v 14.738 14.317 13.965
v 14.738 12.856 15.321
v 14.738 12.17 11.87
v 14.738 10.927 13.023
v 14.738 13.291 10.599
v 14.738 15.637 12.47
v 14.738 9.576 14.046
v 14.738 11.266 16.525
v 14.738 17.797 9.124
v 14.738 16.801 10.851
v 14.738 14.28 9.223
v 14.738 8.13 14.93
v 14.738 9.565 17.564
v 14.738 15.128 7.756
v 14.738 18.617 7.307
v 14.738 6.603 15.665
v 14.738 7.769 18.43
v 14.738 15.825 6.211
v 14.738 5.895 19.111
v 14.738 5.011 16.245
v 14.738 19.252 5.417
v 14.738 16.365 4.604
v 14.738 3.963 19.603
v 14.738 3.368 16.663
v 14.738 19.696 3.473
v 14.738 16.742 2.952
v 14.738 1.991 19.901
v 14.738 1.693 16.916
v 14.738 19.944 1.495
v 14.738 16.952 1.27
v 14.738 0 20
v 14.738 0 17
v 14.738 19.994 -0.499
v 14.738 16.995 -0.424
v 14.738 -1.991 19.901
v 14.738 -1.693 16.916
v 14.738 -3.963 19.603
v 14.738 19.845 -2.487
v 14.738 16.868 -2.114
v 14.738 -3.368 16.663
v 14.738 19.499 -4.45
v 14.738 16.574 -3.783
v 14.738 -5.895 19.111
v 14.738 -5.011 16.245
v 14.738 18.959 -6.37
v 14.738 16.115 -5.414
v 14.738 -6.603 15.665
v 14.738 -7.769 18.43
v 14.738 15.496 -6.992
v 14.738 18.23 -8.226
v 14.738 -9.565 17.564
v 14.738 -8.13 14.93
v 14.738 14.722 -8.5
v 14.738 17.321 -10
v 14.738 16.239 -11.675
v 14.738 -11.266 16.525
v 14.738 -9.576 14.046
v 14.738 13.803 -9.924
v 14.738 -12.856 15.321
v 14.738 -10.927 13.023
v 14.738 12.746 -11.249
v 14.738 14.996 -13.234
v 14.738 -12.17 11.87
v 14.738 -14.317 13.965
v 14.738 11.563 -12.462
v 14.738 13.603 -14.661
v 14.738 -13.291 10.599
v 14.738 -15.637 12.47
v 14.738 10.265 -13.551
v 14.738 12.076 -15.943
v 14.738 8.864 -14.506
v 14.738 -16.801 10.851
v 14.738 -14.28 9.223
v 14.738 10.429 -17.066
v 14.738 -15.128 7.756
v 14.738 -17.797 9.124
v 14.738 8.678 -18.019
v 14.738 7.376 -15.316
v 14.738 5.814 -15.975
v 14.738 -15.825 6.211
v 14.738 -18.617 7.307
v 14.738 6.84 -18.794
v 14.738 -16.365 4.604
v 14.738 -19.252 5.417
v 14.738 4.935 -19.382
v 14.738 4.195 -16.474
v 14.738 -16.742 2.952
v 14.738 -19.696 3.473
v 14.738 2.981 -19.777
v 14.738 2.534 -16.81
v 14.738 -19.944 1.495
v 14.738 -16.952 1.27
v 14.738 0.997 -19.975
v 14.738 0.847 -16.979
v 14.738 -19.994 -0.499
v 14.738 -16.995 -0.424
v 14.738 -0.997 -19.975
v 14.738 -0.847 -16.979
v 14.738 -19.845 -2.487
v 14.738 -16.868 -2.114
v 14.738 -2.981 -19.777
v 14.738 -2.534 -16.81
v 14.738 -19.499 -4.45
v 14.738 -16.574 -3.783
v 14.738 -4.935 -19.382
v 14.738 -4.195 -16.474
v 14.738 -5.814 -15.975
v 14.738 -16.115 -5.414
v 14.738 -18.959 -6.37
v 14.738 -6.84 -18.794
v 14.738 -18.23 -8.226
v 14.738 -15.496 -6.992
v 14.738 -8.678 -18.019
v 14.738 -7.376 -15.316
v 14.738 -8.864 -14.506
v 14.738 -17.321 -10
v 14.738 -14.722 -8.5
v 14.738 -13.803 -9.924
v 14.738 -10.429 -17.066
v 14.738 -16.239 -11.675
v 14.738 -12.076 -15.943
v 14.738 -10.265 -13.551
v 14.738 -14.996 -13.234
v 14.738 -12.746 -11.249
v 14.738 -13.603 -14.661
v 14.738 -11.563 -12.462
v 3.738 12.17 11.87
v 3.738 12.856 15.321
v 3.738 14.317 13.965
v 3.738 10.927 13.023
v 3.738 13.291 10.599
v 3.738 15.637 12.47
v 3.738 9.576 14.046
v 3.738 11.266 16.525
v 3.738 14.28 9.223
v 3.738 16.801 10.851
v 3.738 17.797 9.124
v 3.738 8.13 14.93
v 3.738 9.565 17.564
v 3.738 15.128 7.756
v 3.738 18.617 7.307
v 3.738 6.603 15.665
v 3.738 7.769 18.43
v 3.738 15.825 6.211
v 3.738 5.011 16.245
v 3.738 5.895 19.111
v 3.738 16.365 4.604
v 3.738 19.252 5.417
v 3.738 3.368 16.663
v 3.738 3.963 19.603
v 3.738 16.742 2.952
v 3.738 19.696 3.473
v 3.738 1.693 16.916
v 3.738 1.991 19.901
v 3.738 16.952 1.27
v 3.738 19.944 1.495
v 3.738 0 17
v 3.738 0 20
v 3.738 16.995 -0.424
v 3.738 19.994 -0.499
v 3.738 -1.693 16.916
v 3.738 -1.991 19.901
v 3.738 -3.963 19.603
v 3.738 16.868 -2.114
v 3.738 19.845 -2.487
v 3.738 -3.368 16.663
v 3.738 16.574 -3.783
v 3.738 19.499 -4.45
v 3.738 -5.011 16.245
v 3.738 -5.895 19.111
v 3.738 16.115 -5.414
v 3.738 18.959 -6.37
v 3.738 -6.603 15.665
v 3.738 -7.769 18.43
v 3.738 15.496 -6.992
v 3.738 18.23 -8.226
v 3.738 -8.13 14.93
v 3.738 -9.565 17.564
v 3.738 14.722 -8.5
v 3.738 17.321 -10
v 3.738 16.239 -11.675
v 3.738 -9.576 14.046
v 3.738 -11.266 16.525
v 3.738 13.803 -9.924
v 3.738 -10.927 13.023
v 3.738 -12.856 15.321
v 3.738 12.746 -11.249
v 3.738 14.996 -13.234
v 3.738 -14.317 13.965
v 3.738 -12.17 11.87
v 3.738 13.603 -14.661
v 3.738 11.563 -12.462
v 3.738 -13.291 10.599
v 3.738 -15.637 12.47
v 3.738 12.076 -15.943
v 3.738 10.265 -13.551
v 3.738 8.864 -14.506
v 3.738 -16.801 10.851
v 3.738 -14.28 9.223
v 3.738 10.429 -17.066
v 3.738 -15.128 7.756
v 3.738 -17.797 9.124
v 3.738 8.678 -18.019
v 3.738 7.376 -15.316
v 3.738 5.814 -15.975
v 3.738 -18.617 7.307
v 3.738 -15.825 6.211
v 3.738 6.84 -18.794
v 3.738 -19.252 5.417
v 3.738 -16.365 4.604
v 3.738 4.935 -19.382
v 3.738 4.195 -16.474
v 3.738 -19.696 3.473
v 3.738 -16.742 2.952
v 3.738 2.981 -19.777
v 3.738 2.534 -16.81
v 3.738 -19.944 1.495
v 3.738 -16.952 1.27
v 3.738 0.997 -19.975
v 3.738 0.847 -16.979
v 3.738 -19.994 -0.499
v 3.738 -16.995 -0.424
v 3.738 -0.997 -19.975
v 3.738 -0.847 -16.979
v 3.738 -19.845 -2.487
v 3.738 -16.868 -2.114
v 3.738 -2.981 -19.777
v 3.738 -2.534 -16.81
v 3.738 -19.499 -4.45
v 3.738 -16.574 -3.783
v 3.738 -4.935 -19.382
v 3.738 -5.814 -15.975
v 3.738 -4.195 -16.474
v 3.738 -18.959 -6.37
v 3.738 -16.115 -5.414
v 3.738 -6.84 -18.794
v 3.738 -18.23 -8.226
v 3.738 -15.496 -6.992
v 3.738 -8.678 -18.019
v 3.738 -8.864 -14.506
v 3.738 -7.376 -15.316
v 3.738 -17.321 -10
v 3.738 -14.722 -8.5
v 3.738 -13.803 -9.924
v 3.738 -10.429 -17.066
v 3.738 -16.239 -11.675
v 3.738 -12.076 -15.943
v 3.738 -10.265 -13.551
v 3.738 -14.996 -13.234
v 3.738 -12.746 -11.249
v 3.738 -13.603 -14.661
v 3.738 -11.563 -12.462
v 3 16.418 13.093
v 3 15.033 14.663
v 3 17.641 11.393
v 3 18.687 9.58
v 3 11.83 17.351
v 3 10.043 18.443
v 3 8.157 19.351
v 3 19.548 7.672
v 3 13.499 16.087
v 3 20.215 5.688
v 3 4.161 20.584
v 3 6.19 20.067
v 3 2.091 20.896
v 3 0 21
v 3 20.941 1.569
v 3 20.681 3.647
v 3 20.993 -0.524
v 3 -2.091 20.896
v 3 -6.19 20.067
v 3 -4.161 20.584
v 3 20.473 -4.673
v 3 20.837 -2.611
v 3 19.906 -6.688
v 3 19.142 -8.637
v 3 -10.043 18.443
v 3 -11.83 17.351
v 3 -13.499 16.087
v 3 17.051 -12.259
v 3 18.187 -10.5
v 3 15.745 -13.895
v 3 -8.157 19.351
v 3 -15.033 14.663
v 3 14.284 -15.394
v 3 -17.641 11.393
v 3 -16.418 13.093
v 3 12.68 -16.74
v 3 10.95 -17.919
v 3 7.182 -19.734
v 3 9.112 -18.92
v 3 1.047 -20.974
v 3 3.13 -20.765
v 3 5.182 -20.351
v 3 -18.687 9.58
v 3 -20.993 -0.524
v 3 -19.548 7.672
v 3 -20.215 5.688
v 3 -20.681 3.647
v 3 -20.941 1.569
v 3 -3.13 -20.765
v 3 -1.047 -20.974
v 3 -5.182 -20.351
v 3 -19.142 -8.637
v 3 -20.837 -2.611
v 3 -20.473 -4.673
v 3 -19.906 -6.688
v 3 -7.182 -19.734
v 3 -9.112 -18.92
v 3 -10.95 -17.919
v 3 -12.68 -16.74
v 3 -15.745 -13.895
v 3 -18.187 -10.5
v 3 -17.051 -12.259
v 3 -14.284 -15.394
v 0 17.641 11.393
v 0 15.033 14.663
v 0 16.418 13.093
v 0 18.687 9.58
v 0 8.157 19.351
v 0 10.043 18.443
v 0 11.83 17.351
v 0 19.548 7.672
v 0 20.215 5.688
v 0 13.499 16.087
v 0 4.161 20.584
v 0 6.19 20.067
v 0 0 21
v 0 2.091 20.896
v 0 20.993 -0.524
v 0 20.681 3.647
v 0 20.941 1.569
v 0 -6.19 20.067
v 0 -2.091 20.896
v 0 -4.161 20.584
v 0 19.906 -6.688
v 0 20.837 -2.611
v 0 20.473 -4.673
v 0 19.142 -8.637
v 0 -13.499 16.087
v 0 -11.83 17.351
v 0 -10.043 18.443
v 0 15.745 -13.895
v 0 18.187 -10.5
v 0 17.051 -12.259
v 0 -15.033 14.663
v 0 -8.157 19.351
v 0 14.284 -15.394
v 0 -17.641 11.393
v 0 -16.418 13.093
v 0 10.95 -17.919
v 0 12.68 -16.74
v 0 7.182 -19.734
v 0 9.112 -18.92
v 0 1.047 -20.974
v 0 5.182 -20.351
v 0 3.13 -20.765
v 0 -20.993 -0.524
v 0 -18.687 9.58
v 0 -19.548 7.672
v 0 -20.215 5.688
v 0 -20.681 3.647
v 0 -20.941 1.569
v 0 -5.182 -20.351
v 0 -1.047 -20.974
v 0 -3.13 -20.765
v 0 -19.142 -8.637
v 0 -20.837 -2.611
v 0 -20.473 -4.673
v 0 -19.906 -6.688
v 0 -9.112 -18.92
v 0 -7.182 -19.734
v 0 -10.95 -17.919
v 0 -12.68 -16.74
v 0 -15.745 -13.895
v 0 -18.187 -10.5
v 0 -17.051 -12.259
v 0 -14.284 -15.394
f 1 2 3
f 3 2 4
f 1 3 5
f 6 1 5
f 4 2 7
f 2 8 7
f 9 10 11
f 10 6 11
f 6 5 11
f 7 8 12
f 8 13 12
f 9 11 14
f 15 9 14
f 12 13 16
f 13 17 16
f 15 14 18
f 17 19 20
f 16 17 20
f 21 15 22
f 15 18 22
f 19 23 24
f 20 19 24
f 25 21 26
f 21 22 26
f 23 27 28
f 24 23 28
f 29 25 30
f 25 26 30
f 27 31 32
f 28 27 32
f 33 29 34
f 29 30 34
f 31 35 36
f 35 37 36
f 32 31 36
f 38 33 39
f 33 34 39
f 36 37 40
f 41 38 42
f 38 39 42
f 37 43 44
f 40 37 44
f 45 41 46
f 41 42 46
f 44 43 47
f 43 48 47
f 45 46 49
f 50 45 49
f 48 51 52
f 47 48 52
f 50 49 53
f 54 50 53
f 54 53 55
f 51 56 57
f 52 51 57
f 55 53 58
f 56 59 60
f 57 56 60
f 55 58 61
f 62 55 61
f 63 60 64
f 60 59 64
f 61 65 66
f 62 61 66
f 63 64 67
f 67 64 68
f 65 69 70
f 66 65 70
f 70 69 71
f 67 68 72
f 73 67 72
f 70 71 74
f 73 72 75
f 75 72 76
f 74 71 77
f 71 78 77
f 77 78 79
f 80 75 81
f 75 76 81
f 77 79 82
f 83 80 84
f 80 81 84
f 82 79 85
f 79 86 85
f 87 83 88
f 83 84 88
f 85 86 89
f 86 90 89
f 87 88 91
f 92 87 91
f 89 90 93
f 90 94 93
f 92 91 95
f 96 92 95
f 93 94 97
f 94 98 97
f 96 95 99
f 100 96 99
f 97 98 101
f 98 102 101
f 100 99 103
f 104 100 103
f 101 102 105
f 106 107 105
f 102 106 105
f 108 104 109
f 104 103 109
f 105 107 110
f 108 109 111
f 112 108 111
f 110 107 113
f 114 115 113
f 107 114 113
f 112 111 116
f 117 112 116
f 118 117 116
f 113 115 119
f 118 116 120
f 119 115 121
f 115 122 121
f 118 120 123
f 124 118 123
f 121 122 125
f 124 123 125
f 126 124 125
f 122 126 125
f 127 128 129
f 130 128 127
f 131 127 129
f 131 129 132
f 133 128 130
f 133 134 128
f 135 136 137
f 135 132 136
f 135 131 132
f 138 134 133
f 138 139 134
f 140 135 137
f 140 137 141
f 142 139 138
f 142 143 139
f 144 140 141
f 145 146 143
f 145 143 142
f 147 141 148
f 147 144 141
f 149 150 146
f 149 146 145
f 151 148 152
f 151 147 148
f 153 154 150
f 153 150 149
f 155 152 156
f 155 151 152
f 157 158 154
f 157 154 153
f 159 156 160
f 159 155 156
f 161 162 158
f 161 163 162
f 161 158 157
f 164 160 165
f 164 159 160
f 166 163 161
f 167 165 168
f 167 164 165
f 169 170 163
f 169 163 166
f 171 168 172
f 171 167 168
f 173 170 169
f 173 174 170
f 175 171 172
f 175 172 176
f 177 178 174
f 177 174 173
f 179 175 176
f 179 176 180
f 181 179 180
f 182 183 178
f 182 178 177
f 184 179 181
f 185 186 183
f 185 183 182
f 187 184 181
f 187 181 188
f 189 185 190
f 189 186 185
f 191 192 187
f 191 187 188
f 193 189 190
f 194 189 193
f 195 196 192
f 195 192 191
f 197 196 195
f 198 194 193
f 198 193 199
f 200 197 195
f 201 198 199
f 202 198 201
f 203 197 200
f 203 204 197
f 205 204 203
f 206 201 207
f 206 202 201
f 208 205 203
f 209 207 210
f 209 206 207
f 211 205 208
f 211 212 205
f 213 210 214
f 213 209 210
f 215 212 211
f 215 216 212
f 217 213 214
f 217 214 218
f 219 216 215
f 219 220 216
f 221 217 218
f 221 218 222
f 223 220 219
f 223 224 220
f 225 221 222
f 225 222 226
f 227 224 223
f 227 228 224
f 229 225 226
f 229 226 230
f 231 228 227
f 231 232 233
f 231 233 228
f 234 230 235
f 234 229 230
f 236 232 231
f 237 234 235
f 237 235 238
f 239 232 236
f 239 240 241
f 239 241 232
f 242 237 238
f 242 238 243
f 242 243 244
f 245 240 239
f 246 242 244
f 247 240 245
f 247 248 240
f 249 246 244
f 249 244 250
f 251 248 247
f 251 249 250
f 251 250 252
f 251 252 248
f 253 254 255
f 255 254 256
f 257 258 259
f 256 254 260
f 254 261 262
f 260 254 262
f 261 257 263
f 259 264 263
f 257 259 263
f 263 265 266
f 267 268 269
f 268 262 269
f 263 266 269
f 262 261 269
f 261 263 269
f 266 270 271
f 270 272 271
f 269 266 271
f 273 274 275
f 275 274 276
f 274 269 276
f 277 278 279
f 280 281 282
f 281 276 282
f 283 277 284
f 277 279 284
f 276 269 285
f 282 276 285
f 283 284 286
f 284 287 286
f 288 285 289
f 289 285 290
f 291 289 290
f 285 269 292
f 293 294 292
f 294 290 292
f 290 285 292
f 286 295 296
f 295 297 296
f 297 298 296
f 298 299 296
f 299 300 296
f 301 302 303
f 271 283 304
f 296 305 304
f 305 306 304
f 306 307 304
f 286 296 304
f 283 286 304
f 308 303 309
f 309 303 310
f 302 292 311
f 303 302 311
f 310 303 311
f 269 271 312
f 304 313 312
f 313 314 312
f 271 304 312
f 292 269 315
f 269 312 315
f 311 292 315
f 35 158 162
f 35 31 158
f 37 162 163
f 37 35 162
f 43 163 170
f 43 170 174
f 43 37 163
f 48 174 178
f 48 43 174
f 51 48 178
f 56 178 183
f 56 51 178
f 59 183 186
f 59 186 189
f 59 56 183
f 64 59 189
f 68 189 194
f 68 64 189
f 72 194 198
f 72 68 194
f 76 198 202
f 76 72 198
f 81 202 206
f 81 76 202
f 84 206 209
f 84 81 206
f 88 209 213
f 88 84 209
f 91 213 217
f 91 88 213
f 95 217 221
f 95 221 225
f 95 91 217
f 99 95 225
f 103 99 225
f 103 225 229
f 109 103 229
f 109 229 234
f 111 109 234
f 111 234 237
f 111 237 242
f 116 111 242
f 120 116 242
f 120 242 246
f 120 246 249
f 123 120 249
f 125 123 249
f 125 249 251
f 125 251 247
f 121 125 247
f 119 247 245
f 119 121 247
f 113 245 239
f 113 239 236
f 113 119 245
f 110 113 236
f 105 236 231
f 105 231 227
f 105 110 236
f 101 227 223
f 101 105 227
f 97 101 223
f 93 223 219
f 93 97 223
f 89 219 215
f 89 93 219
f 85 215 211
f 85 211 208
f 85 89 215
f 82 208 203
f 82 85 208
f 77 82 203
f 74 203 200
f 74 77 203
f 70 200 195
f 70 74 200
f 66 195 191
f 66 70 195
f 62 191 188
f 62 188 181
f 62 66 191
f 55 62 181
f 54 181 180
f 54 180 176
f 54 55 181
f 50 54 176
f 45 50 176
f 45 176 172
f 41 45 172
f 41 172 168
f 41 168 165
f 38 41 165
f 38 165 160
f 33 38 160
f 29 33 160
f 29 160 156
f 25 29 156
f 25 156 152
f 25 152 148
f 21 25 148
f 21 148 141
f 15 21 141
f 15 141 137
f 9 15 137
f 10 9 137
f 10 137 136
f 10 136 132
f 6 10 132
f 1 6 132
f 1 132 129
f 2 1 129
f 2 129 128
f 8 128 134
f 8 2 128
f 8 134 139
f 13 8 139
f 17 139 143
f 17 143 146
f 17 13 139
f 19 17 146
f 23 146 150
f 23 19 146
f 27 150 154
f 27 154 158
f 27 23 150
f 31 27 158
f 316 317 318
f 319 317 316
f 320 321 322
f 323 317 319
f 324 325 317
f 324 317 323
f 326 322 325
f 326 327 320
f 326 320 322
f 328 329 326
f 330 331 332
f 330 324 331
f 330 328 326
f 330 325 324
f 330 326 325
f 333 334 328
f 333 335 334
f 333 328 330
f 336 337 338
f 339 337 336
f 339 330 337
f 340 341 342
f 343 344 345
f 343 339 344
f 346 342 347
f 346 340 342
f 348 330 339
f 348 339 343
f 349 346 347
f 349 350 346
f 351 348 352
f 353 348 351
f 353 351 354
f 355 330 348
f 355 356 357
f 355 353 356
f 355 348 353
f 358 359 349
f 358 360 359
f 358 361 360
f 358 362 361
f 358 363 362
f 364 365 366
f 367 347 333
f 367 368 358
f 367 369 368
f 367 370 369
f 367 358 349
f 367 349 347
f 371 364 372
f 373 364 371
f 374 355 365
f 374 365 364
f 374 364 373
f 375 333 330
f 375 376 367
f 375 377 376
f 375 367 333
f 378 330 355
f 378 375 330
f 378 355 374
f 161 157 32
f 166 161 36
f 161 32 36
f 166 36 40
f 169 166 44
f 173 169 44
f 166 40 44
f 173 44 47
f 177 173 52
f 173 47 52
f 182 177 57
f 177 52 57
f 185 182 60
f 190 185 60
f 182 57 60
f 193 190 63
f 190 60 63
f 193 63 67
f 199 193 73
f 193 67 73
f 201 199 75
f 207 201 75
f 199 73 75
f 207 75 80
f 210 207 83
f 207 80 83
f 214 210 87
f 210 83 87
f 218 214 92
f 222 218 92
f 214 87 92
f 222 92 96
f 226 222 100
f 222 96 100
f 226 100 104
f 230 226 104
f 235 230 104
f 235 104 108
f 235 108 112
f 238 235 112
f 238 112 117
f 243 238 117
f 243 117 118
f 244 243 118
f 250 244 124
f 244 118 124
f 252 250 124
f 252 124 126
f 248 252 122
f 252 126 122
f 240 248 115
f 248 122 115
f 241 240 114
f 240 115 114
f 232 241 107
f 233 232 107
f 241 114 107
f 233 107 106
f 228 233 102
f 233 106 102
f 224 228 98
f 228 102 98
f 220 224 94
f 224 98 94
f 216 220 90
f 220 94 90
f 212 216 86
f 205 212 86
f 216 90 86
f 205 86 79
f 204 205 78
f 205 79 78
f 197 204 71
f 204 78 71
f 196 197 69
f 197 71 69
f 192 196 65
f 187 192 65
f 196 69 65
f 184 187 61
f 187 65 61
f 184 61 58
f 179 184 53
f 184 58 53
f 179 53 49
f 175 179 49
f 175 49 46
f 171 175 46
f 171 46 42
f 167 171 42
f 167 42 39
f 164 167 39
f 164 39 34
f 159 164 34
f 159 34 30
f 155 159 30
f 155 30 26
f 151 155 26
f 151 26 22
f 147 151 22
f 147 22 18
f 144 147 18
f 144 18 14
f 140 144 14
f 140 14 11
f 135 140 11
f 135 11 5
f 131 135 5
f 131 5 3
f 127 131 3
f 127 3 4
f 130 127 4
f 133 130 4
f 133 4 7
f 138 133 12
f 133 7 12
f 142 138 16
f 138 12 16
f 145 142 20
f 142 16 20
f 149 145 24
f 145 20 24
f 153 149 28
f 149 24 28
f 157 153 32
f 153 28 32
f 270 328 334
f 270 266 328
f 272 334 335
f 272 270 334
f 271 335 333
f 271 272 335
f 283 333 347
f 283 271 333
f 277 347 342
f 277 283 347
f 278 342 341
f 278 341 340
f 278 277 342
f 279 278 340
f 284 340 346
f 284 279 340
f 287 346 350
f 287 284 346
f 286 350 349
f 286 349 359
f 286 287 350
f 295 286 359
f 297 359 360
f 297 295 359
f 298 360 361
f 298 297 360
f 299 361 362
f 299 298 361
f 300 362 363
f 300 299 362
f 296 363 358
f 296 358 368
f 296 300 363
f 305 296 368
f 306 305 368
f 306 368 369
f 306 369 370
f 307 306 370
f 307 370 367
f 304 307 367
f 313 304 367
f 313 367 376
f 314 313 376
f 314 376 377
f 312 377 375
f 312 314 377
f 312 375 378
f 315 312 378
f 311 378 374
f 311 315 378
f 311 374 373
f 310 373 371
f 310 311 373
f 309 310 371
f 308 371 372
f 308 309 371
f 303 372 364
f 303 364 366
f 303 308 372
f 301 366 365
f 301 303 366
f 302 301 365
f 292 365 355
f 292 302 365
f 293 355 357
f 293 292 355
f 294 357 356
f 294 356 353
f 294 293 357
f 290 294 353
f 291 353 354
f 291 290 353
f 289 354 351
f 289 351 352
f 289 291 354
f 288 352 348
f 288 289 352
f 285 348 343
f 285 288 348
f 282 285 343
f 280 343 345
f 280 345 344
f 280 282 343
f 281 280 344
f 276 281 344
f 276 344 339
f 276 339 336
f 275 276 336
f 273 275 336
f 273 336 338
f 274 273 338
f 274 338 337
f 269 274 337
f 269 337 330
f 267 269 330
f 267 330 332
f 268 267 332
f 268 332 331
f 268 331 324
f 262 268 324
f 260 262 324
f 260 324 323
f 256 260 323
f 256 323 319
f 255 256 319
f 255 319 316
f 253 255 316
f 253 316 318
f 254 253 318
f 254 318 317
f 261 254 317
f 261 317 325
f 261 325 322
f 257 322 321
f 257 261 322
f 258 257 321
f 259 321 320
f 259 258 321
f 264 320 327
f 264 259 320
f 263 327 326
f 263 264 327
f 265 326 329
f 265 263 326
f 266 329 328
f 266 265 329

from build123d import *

# Parameters (mm, degrees)
F0_W = 3
F0_H = 21
F2_W = 11
F2_H = 3


with BuildPart() as f1:
    # F0 (on Front) → F1 (revolve)
    with BuildSketch(Plane.XZ):
        with Locations((1.5, 10.5)):
            Rectangle(F0_W, F0_H)
    revolve(axis=Axis((1.5, 0, 0), (1, 0, 0)))


with BuildPart() as f3:
    # F2 (on Front) → F3 (revolve)
    with BuildSketch(Plane.XZ):
        with Locations((9.238475, 18.5)):
            Rectangle(F2_W, F2_H)
    revolve(axis=Axis((9.238475, 0, 0), (1, 0, 0)))


solid = Compound([f1.part, f3.part])
